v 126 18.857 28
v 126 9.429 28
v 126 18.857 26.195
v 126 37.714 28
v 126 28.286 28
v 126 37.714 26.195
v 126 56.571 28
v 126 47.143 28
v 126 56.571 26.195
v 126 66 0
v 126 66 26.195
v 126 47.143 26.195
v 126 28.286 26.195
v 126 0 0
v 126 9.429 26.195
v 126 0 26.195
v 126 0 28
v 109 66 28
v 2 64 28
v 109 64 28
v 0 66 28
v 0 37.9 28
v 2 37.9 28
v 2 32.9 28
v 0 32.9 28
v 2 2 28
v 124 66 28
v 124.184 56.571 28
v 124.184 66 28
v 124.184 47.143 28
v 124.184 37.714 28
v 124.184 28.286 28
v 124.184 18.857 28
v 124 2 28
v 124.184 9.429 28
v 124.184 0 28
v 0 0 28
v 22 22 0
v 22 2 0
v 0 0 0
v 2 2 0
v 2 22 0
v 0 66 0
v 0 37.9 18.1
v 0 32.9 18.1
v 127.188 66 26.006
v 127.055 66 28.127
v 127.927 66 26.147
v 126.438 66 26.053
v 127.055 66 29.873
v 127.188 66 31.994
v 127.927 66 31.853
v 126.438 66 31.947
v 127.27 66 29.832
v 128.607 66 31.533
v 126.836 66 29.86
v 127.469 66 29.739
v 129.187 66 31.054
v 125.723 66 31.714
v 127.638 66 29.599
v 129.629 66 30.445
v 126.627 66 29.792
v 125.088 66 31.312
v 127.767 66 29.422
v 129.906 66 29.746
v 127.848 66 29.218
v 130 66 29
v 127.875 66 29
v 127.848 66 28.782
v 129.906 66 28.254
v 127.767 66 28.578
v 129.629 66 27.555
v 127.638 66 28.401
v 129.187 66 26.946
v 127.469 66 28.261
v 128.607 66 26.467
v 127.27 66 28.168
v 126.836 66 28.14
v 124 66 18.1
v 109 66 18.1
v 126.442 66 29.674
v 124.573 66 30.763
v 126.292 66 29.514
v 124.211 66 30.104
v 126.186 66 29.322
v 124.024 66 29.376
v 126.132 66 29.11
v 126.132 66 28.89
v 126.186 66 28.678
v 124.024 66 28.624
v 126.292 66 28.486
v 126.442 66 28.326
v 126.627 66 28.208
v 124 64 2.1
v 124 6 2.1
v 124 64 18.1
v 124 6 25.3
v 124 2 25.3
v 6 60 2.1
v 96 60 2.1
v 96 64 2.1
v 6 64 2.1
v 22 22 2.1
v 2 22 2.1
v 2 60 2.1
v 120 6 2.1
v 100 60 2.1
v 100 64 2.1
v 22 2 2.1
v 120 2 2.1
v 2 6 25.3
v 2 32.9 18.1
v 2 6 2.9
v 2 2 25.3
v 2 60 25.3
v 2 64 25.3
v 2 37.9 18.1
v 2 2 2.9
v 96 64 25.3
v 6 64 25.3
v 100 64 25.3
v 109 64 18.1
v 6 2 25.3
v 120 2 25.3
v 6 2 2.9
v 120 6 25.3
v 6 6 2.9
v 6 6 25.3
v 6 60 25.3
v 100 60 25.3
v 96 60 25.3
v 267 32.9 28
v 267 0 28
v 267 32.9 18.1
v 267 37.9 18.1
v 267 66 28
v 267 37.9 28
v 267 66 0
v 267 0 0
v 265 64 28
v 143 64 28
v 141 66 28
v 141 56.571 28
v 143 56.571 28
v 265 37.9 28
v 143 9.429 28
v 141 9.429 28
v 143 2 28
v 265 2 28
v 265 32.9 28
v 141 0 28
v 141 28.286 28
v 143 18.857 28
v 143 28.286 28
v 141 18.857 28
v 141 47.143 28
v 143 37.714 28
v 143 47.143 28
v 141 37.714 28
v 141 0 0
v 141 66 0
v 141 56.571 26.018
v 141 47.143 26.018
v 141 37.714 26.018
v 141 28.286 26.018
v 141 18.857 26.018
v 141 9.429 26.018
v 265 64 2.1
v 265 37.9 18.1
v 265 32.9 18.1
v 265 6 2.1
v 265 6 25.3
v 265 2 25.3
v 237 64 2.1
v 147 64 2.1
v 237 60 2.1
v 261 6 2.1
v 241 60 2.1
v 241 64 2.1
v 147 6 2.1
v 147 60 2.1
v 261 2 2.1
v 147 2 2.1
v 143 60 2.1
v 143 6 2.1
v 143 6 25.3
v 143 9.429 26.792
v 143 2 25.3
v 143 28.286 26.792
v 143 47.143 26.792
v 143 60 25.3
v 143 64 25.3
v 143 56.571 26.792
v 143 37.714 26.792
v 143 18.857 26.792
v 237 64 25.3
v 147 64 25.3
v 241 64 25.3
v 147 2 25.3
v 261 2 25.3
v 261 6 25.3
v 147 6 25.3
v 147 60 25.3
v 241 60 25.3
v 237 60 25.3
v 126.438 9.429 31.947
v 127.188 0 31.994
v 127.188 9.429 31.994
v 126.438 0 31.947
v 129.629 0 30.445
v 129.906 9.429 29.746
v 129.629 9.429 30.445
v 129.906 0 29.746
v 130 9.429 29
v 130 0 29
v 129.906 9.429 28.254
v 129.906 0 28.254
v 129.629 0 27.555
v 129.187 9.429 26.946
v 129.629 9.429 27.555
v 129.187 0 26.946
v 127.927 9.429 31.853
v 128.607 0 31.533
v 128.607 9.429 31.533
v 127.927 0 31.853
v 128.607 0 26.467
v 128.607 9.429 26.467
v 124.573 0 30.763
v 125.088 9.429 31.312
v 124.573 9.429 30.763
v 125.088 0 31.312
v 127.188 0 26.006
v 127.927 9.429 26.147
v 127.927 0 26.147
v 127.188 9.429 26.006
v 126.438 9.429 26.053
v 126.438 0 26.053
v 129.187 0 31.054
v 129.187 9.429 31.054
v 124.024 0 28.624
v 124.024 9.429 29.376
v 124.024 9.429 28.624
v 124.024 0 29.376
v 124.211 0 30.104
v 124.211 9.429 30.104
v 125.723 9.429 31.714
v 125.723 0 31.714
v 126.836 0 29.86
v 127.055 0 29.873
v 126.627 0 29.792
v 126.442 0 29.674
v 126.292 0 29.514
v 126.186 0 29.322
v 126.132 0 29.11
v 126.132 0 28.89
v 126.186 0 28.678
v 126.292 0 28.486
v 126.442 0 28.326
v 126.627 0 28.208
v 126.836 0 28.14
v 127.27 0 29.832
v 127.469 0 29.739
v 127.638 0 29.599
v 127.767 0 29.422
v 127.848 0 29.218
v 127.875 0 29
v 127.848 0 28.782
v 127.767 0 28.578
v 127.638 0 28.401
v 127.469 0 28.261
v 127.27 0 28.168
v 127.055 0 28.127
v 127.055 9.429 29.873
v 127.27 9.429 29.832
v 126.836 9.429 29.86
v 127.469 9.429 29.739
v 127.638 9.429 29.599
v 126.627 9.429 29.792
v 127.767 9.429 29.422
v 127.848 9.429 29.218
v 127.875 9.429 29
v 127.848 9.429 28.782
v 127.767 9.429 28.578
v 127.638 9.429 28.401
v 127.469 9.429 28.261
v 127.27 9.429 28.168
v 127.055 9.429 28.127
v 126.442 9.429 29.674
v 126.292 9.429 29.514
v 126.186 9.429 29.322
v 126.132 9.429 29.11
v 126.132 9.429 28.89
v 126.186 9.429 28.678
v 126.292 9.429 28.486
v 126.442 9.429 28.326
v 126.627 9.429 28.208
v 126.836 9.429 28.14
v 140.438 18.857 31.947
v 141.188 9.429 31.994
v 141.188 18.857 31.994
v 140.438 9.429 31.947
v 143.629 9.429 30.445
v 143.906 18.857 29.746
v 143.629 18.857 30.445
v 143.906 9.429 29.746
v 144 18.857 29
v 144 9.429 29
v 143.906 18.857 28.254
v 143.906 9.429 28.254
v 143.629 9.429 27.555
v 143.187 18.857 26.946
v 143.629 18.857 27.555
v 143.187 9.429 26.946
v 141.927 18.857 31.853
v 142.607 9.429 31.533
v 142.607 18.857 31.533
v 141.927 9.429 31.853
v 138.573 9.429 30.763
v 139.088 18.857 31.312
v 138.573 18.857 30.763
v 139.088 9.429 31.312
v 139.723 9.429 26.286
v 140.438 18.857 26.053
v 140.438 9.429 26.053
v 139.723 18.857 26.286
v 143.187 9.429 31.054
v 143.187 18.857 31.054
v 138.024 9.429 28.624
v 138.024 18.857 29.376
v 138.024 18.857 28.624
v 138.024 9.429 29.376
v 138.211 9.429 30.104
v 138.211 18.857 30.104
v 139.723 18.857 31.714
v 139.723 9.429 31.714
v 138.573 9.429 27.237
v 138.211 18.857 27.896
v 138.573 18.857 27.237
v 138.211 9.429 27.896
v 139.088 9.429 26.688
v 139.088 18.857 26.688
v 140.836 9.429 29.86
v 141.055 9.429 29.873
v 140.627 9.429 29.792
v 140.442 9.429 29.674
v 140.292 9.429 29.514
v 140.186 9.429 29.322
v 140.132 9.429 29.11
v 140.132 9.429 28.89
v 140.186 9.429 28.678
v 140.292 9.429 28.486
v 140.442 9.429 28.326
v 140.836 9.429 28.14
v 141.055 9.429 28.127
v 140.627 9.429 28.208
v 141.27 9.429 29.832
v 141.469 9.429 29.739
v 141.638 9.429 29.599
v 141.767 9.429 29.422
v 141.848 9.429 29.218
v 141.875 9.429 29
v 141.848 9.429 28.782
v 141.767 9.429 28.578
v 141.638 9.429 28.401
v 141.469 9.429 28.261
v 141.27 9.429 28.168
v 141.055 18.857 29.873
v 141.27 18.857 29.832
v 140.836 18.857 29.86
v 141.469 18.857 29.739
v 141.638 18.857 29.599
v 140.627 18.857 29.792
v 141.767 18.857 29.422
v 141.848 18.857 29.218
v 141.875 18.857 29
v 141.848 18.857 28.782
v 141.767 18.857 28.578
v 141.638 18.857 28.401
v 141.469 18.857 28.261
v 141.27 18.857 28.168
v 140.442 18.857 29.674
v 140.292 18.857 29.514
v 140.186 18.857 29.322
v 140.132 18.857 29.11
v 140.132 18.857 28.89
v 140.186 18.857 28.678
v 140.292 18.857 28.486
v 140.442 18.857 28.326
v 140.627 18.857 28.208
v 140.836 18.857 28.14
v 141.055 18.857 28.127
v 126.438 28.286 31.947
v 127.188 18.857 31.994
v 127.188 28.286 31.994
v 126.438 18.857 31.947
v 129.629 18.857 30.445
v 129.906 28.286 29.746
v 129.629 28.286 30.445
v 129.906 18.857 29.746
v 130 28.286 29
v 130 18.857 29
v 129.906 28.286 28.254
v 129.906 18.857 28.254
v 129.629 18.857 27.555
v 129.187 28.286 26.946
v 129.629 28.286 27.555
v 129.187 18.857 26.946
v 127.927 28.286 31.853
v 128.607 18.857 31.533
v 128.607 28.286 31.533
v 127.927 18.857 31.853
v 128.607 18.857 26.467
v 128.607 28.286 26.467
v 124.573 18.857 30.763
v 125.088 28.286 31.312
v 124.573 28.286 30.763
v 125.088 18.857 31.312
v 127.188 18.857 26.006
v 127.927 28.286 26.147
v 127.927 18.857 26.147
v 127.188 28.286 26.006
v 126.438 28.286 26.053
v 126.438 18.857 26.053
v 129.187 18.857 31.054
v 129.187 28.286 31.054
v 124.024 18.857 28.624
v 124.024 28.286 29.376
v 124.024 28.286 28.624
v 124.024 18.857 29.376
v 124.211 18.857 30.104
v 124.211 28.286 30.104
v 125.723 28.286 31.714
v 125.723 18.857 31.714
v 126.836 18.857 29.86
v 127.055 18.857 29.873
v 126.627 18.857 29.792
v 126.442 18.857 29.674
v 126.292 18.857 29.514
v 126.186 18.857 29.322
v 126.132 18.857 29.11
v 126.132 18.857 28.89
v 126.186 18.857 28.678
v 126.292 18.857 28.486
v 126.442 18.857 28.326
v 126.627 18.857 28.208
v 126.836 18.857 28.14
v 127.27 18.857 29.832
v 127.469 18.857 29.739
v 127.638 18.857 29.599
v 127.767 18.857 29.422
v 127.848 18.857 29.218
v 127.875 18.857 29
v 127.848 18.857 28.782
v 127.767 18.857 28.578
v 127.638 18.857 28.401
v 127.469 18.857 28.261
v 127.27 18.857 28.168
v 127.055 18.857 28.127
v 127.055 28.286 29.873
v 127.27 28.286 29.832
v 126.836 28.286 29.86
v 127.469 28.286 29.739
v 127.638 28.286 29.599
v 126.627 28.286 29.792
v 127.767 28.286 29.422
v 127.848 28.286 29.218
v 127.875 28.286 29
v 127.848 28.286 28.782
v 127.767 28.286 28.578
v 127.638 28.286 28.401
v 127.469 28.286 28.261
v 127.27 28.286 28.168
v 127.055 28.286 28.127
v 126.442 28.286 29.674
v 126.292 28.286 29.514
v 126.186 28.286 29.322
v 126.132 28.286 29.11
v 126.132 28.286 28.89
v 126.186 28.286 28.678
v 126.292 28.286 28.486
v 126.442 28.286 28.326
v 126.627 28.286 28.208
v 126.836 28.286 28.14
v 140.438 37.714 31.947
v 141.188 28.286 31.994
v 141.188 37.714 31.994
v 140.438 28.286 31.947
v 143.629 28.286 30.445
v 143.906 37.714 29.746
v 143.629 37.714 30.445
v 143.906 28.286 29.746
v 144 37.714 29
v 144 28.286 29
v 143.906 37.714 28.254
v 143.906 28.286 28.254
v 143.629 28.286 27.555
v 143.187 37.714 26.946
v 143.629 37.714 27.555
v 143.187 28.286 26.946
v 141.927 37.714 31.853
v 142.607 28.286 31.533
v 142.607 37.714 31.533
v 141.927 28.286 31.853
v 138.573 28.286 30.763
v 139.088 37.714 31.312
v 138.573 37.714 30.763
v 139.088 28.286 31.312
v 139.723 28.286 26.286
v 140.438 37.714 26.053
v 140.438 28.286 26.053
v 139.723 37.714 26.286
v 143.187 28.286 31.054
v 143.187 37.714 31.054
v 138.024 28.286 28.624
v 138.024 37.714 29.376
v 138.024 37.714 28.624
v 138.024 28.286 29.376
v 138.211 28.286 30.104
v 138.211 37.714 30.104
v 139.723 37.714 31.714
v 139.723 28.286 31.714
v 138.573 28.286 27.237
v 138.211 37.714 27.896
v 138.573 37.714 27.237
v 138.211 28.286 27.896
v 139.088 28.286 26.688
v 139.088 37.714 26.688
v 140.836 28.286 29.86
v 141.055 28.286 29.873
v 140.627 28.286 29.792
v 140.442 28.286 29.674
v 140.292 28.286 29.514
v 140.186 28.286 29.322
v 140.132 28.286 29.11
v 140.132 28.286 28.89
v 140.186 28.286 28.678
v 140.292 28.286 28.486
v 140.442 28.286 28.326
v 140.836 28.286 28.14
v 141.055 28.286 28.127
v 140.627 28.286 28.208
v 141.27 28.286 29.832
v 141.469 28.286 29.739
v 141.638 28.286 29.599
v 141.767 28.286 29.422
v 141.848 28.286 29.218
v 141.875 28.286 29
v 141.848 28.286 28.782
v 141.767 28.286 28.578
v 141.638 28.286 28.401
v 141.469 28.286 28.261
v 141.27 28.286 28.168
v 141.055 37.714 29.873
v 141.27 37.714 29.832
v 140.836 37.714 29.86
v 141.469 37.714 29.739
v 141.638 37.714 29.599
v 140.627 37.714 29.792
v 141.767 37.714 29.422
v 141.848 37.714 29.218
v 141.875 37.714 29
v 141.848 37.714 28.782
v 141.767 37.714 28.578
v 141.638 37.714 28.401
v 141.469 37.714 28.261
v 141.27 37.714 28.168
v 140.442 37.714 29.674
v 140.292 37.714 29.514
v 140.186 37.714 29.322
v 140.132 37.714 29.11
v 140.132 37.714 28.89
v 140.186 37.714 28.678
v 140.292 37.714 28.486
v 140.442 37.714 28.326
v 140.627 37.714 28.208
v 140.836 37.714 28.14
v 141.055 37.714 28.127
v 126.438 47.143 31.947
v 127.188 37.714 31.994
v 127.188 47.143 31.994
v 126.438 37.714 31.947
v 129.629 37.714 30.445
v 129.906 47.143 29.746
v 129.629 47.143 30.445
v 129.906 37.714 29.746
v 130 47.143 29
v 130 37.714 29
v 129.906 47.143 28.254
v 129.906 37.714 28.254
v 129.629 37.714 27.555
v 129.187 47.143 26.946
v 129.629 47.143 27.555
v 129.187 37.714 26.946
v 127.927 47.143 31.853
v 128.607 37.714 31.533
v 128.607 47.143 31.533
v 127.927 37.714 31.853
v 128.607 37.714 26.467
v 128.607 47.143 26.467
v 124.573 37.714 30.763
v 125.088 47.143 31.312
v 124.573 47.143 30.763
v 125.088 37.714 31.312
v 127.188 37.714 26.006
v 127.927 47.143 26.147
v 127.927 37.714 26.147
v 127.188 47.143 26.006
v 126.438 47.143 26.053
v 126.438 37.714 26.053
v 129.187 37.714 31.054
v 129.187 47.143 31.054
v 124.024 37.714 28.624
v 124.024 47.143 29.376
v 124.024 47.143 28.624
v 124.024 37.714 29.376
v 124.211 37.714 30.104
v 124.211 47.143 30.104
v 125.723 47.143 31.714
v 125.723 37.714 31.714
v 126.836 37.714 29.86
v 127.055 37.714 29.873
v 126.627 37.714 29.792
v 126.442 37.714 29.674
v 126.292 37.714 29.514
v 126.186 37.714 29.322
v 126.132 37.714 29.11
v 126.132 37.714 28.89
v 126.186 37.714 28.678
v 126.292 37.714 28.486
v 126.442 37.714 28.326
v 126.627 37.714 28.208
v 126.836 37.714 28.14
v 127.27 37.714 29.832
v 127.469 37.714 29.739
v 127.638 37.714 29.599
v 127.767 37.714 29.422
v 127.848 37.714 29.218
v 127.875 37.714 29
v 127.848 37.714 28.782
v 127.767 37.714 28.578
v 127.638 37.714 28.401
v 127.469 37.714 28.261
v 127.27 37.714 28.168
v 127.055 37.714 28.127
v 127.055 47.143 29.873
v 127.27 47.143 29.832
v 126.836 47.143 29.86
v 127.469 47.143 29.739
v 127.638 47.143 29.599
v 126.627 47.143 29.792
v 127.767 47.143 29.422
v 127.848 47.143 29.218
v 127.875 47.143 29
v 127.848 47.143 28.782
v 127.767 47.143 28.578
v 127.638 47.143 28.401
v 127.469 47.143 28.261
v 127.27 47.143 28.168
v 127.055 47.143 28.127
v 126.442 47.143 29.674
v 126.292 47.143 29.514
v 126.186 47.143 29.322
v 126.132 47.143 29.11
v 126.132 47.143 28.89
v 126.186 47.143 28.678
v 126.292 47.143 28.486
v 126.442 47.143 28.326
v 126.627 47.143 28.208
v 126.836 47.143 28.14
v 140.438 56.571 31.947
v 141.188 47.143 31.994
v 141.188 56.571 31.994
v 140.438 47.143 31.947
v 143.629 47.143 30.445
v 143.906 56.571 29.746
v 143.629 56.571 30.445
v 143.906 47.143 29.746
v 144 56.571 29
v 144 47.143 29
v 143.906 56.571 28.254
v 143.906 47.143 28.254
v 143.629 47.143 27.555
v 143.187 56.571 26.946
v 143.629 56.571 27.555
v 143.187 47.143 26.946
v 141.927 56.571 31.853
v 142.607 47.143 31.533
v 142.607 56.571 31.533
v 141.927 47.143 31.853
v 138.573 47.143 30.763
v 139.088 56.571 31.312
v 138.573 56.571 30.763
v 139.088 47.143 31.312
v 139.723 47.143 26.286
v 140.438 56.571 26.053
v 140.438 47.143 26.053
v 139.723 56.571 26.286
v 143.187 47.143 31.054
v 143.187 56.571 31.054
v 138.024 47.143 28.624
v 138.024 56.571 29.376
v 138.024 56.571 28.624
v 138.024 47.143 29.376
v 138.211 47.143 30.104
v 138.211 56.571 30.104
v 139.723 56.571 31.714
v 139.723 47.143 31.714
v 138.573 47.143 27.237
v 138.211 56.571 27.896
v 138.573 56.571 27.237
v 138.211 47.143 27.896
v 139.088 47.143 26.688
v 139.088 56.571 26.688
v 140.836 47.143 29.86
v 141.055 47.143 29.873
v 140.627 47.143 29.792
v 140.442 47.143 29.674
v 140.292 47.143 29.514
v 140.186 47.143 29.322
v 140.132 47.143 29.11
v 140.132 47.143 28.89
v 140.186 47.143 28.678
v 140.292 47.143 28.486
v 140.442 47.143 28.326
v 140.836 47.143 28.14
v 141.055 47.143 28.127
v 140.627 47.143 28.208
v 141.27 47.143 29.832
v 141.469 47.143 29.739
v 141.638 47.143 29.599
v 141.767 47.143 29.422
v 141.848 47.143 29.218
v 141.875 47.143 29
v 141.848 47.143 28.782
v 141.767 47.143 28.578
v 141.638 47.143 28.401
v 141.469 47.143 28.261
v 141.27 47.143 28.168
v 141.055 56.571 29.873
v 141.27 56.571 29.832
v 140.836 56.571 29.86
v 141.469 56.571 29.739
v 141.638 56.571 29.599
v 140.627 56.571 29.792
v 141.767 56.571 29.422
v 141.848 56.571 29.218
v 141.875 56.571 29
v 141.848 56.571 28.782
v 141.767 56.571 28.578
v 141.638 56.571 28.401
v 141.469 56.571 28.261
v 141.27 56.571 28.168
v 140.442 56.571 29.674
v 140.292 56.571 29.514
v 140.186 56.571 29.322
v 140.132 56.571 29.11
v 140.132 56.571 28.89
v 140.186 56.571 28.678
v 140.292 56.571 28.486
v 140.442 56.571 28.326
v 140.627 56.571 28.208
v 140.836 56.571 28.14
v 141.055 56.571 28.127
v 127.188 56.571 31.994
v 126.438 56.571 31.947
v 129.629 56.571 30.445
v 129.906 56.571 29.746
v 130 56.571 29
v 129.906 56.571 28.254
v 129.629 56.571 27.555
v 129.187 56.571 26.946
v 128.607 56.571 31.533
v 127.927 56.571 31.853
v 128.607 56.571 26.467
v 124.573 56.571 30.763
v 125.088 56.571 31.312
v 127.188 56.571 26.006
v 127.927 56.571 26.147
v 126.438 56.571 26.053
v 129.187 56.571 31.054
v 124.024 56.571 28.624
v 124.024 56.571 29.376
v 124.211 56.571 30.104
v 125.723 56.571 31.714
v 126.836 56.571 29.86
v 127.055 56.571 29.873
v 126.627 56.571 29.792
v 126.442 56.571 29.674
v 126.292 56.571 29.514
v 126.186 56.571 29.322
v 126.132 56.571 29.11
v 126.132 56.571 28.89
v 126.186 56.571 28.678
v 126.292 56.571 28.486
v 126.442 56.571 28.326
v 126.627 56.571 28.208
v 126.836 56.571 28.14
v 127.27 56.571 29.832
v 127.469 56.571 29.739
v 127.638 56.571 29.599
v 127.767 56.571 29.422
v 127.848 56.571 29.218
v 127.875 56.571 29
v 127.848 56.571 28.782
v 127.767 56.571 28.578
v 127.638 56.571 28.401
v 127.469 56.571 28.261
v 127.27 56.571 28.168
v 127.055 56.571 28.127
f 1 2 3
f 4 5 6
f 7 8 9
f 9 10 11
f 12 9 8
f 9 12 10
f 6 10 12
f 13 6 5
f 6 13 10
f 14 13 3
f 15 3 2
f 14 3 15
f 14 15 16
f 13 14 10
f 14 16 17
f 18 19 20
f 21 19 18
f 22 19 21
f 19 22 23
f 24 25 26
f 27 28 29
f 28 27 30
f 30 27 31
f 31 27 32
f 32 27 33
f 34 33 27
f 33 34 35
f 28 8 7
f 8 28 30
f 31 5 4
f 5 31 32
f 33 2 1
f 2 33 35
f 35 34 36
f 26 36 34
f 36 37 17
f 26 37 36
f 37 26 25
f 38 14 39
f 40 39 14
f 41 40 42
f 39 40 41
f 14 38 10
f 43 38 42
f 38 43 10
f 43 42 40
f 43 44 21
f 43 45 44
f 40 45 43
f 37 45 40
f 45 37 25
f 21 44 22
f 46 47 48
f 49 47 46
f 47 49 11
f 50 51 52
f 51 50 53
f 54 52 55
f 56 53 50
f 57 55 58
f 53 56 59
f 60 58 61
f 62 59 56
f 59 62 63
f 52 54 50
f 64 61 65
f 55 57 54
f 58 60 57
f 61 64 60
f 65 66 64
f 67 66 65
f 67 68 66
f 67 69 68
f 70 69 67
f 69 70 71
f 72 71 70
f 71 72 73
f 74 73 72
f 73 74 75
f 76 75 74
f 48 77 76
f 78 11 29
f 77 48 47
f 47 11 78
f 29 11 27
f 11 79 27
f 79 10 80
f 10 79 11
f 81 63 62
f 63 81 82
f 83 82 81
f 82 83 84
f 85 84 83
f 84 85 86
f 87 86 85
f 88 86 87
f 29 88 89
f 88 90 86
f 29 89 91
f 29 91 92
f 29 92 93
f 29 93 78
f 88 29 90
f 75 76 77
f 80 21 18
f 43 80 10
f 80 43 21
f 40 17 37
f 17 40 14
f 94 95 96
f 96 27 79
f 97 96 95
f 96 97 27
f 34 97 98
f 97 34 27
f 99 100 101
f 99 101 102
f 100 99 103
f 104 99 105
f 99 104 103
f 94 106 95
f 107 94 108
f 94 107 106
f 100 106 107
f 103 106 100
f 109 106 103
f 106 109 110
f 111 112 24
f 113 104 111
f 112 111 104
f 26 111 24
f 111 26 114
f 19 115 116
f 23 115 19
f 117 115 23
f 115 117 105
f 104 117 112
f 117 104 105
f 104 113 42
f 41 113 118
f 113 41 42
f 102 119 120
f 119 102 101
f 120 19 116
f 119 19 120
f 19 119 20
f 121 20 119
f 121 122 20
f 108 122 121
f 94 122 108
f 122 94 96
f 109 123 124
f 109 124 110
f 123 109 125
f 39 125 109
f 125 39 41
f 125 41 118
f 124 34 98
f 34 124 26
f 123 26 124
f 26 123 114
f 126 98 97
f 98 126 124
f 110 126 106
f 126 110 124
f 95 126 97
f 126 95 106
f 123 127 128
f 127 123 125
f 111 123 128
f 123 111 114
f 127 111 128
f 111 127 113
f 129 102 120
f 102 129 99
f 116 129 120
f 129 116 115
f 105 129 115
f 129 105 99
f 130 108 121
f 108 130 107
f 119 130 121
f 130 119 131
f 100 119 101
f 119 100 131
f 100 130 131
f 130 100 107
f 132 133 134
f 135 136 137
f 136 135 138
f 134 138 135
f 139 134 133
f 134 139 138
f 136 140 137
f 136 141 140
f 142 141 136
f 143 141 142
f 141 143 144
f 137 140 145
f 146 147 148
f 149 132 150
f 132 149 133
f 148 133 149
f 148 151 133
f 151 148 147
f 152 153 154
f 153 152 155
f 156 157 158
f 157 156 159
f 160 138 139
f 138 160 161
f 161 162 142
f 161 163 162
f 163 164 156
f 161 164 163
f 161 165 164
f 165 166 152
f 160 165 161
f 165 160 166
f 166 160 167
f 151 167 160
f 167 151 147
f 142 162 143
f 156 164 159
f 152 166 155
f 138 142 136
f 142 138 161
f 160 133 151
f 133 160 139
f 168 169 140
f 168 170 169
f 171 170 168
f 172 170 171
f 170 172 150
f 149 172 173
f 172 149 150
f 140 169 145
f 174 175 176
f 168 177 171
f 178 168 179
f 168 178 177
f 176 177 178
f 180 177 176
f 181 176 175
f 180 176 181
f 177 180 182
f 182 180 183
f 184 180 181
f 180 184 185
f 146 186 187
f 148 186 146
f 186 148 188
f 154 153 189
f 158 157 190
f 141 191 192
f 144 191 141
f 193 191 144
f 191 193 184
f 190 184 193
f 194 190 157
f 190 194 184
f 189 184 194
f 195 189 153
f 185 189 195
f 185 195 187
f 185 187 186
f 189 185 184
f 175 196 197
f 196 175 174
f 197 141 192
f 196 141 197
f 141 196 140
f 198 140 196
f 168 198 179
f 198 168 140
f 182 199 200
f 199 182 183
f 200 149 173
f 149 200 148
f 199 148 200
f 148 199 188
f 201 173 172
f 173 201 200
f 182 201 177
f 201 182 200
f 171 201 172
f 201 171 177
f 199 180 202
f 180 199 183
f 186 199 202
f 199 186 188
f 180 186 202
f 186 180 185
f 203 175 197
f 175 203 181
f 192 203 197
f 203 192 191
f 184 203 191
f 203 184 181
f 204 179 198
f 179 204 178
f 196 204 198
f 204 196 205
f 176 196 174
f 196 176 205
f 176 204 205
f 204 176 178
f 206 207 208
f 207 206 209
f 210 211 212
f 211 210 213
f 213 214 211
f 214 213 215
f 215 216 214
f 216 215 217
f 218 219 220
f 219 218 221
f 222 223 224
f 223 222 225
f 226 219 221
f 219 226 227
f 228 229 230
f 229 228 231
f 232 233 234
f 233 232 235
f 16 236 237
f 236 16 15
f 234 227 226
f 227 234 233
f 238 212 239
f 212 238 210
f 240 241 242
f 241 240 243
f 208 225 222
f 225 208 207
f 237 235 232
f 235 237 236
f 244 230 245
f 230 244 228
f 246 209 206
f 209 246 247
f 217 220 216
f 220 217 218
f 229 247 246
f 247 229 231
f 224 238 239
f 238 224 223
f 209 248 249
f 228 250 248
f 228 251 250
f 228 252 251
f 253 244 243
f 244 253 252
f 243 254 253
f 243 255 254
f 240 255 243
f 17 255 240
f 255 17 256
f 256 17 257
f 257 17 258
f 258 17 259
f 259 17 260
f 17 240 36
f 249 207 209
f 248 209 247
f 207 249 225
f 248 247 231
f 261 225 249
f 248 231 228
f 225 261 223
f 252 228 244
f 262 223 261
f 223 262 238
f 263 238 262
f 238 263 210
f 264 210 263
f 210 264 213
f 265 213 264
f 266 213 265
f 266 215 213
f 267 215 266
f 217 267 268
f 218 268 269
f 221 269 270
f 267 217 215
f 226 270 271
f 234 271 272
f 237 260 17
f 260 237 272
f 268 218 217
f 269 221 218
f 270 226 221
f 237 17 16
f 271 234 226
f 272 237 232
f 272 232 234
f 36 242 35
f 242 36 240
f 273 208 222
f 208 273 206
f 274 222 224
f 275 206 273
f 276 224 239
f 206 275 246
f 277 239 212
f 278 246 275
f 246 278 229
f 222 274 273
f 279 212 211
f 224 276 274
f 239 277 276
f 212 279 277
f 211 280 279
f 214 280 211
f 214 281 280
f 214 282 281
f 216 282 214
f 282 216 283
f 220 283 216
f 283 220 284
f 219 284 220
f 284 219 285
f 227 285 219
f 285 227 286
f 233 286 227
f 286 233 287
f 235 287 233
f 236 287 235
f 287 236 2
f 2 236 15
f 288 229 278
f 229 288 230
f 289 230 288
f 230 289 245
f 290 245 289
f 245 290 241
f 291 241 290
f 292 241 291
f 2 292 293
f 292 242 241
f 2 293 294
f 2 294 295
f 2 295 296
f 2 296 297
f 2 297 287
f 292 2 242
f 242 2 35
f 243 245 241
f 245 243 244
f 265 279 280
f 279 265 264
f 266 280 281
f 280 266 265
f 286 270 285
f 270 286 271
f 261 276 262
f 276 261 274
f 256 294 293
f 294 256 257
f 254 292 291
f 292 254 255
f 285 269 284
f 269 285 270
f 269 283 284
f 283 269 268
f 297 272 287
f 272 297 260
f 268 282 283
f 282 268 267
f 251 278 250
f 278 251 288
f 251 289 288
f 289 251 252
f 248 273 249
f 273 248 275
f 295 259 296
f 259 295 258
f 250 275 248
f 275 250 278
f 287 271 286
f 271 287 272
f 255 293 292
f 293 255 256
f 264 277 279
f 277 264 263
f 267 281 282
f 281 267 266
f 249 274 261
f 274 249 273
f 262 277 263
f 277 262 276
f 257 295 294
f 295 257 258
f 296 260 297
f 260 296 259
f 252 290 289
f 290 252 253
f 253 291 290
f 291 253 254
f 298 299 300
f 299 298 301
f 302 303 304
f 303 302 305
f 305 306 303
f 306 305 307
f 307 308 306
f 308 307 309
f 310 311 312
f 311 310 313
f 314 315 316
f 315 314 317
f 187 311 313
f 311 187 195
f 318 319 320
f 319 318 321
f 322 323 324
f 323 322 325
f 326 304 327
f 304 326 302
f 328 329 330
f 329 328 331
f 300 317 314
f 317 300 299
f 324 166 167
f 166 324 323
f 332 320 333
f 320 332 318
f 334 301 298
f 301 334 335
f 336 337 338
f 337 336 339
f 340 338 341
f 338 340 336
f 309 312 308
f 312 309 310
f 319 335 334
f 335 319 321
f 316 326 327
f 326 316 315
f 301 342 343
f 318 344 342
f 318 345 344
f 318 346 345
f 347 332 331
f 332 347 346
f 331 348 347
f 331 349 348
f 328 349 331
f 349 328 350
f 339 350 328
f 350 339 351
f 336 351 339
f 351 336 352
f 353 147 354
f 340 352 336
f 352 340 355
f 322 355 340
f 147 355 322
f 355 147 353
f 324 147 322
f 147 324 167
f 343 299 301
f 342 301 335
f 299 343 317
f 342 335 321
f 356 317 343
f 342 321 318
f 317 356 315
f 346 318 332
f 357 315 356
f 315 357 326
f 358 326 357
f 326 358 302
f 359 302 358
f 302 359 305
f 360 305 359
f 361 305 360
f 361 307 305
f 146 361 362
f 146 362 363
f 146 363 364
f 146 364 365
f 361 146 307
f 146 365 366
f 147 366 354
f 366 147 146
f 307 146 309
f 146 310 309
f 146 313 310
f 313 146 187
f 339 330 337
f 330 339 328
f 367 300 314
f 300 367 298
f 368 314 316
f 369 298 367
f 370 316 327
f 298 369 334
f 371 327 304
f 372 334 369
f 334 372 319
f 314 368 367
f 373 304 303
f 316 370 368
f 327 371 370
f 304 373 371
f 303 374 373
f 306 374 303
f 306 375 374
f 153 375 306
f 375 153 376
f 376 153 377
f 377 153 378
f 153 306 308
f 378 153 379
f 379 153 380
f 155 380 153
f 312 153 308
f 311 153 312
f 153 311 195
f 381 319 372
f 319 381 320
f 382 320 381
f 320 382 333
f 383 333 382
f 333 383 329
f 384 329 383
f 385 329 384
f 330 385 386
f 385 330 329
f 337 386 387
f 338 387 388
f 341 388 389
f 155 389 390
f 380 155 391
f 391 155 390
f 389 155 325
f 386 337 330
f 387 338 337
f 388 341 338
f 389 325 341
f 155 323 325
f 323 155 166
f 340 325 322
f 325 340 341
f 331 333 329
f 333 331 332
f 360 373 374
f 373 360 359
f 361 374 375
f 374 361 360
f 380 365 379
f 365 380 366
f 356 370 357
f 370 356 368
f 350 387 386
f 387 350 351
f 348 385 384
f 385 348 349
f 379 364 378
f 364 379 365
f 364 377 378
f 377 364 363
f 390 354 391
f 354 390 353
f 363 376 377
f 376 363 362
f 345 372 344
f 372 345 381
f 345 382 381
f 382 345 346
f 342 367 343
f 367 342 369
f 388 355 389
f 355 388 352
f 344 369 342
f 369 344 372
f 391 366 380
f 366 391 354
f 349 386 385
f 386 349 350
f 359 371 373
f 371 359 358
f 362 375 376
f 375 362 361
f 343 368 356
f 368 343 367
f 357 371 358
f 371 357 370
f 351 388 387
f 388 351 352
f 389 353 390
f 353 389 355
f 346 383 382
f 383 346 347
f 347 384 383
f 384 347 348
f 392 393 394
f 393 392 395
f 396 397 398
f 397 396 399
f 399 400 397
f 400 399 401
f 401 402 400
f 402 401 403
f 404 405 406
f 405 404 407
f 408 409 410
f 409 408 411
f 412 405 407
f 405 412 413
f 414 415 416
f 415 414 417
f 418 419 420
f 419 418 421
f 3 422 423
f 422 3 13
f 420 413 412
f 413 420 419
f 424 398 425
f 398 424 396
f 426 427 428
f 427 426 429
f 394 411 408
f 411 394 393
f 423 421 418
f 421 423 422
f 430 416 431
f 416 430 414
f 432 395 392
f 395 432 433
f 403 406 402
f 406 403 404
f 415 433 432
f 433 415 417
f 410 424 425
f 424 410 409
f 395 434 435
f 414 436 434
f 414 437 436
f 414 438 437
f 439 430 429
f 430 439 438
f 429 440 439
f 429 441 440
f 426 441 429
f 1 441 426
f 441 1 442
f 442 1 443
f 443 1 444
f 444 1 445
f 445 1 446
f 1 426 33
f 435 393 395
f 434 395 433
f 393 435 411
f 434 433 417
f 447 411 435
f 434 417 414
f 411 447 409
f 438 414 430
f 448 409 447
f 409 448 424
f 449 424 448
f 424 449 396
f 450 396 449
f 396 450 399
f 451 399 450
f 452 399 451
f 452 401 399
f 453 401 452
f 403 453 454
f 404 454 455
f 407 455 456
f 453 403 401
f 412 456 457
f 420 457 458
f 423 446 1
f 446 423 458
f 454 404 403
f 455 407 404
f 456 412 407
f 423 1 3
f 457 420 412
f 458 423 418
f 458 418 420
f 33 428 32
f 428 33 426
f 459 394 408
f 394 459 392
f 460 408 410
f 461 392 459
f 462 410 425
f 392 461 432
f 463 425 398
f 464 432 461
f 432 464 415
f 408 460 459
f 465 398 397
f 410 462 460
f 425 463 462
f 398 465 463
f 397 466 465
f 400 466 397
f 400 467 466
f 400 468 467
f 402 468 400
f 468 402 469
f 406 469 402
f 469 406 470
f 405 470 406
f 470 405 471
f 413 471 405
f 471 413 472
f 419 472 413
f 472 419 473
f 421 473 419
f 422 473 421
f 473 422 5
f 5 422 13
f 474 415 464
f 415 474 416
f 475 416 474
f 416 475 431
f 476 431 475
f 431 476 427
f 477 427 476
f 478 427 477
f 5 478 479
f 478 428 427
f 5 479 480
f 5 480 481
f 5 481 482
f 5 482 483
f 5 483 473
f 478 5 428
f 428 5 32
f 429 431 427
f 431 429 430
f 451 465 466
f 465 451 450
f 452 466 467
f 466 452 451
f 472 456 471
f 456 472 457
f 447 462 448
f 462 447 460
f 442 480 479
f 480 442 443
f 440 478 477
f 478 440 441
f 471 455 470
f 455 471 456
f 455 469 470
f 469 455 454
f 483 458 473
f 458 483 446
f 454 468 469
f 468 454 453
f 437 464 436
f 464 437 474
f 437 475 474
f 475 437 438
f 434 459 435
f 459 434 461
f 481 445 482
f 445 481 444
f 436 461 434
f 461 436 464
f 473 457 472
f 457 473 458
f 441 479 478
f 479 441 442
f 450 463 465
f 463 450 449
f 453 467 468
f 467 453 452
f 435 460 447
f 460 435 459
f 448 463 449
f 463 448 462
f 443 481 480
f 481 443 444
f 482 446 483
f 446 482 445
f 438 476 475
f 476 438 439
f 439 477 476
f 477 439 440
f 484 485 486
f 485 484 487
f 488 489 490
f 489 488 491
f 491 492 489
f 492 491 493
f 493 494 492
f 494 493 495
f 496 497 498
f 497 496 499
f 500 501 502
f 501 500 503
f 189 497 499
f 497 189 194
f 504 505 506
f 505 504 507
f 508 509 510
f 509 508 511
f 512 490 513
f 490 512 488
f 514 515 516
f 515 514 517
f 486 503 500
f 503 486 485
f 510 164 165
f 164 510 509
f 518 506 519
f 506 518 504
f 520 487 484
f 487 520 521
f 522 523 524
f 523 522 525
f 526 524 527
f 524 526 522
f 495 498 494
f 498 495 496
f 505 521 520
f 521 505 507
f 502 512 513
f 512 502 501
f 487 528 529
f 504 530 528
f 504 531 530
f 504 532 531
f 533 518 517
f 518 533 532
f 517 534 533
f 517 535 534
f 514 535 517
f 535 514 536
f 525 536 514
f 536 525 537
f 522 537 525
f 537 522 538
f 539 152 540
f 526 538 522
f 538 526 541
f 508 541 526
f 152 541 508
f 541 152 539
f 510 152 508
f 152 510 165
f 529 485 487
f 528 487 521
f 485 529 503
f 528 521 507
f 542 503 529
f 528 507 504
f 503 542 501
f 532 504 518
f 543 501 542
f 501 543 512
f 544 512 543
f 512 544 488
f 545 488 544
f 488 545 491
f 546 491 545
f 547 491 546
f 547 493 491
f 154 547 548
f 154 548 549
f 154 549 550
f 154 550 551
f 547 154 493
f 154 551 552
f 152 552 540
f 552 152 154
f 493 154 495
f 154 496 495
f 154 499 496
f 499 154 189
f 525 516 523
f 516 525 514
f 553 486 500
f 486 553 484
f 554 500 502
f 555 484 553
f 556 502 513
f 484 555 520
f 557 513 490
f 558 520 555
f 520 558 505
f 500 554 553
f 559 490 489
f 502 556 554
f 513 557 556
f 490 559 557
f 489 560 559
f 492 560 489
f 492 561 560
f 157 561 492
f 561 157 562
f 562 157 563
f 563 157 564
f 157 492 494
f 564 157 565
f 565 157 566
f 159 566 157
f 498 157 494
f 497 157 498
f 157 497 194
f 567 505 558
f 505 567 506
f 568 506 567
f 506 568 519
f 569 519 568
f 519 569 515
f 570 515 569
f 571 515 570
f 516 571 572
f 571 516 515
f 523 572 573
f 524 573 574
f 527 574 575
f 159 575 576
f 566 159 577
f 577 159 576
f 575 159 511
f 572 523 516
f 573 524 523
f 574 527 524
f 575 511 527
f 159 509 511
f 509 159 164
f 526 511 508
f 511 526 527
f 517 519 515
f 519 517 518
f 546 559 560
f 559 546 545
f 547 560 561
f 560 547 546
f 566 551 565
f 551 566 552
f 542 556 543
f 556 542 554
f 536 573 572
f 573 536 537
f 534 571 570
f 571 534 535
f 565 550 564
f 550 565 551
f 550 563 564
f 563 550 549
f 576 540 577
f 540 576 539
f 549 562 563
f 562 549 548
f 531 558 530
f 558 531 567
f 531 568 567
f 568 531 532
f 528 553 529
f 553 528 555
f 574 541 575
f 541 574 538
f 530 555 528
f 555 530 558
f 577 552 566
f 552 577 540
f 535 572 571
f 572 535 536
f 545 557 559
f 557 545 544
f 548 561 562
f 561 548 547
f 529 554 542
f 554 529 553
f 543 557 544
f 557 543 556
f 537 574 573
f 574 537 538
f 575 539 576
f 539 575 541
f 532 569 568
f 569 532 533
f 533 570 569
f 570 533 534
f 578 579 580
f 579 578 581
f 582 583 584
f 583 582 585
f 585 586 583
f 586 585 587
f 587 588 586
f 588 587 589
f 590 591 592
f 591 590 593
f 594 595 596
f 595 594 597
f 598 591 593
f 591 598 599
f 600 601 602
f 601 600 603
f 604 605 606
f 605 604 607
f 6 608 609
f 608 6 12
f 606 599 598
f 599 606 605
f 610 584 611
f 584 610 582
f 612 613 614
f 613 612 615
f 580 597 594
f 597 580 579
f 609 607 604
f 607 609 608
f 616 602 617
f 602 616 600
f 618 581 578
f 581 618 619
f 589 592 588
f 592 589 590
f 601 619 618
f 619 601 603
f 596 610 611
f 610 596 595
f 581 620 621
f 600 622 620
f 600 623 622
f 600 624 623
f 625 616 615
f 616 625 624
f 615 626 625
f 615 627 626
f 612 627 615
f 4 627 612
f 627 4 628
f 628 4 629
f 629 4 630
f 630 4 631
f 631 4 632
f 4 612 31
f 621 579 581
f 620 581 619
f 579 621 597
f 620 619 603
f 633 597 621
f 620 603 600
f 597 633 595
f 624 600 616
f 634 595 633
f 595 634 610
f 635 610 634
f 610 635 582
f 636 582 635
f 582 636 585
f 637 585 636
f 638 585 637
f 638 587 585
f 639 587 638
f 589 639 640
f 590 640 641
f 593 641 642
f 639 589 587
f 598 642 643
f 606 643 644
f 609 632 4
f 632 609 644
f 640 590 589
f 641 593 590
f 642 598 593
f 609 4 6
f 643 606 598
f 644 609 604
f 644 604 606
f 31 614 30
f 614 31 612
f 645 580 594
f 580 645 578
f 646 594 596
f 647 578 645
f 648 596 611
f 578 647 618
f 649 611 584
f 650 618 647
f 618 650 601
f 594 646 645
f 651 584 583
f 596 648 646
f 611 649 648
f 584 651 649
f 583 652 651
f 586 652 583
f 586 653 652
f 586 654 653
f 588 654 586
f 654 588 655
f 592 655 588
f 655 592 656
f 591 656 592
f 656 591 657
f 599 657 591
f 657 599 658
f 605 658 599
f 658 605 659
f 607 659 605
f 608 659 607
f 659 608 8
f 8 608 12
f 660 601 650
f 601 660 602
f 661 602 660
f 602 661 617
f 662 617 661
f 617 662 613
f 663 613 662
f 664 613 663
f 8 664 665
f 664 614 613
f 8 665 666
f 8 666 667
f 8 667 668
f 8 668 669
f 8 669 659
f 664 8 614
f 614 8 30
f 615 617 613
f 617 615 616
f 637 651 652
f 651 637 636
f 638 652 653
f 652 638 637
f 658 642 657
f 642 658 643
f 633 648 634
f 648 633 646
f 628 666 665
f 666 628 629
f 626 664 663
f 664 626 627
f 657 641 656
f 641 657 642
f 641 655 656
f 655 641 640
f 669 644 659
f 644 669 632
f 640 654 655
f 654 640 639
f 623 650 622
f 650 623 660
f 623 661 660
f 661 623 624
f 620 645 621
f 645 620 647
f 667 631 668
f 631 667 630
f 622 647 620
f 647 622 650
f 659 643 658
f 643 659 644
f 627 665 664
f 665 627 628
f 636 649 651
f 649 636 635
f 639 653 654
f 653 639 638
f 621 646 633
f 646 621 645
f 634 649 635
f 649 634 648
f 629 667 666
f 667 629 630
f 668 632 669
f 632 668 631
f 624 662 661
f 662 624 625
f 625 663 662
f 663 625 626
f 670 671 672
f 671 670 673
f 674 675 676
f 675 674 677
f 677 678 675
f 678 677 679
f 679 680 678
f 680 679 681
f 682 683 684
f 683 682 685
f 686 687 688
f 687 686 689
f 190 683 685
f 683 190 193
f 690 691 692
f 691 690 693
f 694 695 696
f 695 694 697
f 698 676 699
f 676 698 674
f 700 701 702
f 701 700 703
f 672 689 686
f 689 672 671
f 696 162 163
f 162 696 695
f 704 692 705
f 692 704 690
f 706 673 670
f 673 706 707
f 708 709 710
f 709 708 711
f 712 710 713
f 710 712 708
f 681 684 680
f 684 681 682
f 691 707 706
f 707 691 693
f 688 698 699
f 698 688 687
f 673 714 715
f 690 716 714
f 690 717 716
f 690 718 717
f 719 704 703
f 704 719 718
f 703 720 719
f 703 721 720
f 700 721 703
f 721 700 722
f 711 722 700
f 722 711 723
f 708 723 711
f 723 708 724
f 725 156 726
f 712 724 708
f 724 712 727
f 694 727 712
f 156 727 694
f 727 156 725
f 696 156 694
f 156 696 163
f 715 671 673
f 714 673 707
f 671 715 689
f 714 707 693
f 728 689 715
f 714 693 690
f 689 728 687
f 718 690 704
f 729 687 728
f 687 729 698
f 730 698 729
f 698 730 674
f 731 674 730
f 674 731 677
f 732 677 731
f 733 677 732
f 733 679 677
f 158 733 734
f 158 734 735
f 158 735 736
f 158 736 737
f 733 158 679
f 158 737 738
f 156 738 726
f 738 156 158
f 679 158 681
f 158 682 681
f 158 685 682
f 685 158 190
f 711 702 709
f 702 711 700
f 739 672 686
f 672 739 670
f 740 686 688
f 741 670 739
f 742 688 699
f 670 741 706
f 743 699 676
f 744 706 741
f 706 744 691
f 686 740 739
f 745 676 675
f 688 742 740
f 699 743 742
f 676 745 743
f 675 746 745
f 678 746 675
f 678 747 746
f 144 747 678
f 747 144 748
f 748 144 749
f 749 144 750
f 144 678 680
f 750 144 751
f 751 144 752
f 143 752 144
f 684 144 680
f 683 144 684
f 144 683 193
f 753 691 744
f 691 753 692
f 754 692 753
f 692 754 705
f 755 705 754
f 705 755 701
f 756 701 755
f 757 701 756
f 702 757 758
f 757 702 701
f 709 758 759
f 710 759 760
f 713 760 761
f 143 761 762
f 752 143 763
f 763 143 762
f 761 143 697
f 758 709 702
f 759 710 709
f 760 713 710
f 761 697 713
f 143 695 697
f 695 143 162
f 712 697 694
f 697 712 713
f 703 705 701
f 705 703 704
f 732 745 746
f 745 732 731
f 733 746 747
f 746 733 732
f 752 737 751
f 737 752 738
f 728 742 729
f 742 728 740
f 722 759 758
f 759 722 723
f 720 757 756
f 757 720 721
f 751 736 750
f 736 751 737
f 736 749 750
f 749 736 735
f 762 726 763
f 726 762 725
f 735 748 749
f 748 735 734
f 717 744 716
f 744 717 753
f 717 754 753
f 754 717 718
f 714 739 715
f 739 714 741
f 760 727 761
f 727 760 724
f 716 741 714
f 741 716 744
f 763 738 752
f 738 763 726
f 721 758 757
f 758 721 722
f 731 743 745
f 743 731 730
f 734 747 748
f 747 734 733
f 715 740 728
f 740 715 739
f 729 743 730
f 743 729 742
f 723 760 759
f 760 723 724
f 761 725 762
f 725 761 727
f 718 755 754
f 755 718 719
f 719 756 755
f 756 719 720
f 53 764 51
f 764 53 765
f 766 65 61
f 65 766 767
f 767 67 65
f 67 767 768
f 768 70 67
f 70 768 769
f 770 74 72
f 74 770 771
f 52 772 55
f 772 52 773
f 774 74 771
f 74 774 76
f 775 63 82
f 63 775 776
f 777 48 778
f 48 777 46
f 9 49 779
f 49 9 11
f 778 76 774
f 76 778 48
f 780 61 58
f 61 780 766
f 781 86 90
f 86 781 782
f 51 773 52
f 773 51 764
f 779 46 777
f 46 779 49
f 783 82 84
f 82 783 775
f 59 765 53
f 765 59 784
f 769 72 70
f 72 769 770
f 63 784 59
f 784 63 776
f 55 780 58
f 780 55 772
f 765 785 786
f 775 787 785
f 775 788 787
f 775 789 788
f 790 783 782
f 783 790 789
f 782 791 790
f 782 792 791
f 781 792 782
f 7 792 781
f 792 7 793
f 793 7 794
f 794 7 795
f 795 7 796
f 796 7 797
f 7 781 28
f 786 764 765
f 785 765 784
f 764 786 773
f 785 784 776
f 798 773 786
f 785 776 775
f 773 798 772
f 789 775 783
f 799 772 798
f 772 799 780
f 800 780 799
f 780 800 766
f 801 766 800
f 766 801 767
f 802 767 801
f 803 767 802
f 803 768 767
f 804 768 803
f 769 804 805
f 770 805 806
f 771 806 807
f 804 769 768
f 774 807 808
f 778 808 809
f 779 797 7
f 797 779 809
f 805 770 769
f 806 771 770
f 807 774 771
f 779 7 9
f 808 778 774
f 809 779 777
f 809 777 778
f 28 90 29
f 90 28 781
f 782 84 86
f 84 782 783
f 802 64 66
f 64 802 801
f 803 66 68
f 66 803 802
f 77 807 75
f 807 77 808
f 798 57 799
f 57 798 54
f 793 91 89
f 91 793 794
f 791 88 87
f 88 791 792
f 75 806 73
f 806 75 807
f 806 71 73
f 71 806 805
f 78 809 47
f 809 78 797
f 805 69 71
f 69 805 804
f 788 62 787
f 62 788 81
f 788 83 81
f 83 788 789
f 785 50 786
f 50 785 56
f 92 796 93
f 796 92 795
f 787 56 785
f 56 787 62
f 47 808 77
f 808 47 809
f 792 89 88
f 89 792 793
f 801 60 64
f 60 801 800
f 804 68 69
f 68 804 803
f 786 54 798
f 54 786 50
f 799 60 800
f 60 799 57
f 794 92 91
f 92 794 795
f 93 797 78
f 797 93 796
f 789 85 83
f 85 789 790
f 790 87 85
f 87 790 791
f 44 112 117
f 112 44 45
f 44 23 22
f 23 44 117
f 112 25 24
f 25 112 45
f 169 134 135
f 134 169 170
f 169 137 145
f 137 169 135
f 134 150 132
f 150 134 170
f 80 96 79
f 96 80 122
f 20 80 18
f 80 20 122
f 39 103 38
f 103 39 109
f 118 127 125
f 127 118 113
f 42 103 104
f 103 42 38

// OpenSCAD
$fn=25;
height = 28;
depth = 126;
width = 66;
module halfbox(){
	union(){
		difference(){
			cube([depth,width,height]);
			translate([2,2,2.1])cube([depth-4,width-4,height-2]);
		}
	}
	translate([depth-6,0,0])cube([6,6,height-2.7]);
	cube([6,6,height-2.7]);
	translate([2,width-6,0])cube([4,4,height-2.7]);
	translate([depth-30,width-6,0])cube([4,4,height-2.7]);
}

module halfhinge(n,o){
	translate([depth+(o),(width/7)*n,height+1]){
		rotate([90,0,0]){
			difference(){
				cylinder(h=(width/7),r=3);
				color([1,0,0])cylinder(h=10,r=1.75/2);
			}
		}
	}
}
module box(){
	union(){
	halfbox();
	translate([depth+15,0,0]){
	halfbox();}
	halfhinge(1,1);
	halfhinge(2,15);
	halfhinge(3,1);
	halfhinge(4,15);
	halfhinge(5,1);
	halfhinge(6,15);
	halfhinge(7,1);
	}		
}
difference(){	
	box();
	translate([-.1,width/2-.1,height-9.9])cube([5,5,10]);
	translate([depth*2+15-4,width/2-.1,height-9.9])cube([5,5,10]);
	translate([depth-17, width-4.5, height-9.9])cube([15,5,10]);
	translate([2, 2, -.1])cube([20,20,3]);

}
